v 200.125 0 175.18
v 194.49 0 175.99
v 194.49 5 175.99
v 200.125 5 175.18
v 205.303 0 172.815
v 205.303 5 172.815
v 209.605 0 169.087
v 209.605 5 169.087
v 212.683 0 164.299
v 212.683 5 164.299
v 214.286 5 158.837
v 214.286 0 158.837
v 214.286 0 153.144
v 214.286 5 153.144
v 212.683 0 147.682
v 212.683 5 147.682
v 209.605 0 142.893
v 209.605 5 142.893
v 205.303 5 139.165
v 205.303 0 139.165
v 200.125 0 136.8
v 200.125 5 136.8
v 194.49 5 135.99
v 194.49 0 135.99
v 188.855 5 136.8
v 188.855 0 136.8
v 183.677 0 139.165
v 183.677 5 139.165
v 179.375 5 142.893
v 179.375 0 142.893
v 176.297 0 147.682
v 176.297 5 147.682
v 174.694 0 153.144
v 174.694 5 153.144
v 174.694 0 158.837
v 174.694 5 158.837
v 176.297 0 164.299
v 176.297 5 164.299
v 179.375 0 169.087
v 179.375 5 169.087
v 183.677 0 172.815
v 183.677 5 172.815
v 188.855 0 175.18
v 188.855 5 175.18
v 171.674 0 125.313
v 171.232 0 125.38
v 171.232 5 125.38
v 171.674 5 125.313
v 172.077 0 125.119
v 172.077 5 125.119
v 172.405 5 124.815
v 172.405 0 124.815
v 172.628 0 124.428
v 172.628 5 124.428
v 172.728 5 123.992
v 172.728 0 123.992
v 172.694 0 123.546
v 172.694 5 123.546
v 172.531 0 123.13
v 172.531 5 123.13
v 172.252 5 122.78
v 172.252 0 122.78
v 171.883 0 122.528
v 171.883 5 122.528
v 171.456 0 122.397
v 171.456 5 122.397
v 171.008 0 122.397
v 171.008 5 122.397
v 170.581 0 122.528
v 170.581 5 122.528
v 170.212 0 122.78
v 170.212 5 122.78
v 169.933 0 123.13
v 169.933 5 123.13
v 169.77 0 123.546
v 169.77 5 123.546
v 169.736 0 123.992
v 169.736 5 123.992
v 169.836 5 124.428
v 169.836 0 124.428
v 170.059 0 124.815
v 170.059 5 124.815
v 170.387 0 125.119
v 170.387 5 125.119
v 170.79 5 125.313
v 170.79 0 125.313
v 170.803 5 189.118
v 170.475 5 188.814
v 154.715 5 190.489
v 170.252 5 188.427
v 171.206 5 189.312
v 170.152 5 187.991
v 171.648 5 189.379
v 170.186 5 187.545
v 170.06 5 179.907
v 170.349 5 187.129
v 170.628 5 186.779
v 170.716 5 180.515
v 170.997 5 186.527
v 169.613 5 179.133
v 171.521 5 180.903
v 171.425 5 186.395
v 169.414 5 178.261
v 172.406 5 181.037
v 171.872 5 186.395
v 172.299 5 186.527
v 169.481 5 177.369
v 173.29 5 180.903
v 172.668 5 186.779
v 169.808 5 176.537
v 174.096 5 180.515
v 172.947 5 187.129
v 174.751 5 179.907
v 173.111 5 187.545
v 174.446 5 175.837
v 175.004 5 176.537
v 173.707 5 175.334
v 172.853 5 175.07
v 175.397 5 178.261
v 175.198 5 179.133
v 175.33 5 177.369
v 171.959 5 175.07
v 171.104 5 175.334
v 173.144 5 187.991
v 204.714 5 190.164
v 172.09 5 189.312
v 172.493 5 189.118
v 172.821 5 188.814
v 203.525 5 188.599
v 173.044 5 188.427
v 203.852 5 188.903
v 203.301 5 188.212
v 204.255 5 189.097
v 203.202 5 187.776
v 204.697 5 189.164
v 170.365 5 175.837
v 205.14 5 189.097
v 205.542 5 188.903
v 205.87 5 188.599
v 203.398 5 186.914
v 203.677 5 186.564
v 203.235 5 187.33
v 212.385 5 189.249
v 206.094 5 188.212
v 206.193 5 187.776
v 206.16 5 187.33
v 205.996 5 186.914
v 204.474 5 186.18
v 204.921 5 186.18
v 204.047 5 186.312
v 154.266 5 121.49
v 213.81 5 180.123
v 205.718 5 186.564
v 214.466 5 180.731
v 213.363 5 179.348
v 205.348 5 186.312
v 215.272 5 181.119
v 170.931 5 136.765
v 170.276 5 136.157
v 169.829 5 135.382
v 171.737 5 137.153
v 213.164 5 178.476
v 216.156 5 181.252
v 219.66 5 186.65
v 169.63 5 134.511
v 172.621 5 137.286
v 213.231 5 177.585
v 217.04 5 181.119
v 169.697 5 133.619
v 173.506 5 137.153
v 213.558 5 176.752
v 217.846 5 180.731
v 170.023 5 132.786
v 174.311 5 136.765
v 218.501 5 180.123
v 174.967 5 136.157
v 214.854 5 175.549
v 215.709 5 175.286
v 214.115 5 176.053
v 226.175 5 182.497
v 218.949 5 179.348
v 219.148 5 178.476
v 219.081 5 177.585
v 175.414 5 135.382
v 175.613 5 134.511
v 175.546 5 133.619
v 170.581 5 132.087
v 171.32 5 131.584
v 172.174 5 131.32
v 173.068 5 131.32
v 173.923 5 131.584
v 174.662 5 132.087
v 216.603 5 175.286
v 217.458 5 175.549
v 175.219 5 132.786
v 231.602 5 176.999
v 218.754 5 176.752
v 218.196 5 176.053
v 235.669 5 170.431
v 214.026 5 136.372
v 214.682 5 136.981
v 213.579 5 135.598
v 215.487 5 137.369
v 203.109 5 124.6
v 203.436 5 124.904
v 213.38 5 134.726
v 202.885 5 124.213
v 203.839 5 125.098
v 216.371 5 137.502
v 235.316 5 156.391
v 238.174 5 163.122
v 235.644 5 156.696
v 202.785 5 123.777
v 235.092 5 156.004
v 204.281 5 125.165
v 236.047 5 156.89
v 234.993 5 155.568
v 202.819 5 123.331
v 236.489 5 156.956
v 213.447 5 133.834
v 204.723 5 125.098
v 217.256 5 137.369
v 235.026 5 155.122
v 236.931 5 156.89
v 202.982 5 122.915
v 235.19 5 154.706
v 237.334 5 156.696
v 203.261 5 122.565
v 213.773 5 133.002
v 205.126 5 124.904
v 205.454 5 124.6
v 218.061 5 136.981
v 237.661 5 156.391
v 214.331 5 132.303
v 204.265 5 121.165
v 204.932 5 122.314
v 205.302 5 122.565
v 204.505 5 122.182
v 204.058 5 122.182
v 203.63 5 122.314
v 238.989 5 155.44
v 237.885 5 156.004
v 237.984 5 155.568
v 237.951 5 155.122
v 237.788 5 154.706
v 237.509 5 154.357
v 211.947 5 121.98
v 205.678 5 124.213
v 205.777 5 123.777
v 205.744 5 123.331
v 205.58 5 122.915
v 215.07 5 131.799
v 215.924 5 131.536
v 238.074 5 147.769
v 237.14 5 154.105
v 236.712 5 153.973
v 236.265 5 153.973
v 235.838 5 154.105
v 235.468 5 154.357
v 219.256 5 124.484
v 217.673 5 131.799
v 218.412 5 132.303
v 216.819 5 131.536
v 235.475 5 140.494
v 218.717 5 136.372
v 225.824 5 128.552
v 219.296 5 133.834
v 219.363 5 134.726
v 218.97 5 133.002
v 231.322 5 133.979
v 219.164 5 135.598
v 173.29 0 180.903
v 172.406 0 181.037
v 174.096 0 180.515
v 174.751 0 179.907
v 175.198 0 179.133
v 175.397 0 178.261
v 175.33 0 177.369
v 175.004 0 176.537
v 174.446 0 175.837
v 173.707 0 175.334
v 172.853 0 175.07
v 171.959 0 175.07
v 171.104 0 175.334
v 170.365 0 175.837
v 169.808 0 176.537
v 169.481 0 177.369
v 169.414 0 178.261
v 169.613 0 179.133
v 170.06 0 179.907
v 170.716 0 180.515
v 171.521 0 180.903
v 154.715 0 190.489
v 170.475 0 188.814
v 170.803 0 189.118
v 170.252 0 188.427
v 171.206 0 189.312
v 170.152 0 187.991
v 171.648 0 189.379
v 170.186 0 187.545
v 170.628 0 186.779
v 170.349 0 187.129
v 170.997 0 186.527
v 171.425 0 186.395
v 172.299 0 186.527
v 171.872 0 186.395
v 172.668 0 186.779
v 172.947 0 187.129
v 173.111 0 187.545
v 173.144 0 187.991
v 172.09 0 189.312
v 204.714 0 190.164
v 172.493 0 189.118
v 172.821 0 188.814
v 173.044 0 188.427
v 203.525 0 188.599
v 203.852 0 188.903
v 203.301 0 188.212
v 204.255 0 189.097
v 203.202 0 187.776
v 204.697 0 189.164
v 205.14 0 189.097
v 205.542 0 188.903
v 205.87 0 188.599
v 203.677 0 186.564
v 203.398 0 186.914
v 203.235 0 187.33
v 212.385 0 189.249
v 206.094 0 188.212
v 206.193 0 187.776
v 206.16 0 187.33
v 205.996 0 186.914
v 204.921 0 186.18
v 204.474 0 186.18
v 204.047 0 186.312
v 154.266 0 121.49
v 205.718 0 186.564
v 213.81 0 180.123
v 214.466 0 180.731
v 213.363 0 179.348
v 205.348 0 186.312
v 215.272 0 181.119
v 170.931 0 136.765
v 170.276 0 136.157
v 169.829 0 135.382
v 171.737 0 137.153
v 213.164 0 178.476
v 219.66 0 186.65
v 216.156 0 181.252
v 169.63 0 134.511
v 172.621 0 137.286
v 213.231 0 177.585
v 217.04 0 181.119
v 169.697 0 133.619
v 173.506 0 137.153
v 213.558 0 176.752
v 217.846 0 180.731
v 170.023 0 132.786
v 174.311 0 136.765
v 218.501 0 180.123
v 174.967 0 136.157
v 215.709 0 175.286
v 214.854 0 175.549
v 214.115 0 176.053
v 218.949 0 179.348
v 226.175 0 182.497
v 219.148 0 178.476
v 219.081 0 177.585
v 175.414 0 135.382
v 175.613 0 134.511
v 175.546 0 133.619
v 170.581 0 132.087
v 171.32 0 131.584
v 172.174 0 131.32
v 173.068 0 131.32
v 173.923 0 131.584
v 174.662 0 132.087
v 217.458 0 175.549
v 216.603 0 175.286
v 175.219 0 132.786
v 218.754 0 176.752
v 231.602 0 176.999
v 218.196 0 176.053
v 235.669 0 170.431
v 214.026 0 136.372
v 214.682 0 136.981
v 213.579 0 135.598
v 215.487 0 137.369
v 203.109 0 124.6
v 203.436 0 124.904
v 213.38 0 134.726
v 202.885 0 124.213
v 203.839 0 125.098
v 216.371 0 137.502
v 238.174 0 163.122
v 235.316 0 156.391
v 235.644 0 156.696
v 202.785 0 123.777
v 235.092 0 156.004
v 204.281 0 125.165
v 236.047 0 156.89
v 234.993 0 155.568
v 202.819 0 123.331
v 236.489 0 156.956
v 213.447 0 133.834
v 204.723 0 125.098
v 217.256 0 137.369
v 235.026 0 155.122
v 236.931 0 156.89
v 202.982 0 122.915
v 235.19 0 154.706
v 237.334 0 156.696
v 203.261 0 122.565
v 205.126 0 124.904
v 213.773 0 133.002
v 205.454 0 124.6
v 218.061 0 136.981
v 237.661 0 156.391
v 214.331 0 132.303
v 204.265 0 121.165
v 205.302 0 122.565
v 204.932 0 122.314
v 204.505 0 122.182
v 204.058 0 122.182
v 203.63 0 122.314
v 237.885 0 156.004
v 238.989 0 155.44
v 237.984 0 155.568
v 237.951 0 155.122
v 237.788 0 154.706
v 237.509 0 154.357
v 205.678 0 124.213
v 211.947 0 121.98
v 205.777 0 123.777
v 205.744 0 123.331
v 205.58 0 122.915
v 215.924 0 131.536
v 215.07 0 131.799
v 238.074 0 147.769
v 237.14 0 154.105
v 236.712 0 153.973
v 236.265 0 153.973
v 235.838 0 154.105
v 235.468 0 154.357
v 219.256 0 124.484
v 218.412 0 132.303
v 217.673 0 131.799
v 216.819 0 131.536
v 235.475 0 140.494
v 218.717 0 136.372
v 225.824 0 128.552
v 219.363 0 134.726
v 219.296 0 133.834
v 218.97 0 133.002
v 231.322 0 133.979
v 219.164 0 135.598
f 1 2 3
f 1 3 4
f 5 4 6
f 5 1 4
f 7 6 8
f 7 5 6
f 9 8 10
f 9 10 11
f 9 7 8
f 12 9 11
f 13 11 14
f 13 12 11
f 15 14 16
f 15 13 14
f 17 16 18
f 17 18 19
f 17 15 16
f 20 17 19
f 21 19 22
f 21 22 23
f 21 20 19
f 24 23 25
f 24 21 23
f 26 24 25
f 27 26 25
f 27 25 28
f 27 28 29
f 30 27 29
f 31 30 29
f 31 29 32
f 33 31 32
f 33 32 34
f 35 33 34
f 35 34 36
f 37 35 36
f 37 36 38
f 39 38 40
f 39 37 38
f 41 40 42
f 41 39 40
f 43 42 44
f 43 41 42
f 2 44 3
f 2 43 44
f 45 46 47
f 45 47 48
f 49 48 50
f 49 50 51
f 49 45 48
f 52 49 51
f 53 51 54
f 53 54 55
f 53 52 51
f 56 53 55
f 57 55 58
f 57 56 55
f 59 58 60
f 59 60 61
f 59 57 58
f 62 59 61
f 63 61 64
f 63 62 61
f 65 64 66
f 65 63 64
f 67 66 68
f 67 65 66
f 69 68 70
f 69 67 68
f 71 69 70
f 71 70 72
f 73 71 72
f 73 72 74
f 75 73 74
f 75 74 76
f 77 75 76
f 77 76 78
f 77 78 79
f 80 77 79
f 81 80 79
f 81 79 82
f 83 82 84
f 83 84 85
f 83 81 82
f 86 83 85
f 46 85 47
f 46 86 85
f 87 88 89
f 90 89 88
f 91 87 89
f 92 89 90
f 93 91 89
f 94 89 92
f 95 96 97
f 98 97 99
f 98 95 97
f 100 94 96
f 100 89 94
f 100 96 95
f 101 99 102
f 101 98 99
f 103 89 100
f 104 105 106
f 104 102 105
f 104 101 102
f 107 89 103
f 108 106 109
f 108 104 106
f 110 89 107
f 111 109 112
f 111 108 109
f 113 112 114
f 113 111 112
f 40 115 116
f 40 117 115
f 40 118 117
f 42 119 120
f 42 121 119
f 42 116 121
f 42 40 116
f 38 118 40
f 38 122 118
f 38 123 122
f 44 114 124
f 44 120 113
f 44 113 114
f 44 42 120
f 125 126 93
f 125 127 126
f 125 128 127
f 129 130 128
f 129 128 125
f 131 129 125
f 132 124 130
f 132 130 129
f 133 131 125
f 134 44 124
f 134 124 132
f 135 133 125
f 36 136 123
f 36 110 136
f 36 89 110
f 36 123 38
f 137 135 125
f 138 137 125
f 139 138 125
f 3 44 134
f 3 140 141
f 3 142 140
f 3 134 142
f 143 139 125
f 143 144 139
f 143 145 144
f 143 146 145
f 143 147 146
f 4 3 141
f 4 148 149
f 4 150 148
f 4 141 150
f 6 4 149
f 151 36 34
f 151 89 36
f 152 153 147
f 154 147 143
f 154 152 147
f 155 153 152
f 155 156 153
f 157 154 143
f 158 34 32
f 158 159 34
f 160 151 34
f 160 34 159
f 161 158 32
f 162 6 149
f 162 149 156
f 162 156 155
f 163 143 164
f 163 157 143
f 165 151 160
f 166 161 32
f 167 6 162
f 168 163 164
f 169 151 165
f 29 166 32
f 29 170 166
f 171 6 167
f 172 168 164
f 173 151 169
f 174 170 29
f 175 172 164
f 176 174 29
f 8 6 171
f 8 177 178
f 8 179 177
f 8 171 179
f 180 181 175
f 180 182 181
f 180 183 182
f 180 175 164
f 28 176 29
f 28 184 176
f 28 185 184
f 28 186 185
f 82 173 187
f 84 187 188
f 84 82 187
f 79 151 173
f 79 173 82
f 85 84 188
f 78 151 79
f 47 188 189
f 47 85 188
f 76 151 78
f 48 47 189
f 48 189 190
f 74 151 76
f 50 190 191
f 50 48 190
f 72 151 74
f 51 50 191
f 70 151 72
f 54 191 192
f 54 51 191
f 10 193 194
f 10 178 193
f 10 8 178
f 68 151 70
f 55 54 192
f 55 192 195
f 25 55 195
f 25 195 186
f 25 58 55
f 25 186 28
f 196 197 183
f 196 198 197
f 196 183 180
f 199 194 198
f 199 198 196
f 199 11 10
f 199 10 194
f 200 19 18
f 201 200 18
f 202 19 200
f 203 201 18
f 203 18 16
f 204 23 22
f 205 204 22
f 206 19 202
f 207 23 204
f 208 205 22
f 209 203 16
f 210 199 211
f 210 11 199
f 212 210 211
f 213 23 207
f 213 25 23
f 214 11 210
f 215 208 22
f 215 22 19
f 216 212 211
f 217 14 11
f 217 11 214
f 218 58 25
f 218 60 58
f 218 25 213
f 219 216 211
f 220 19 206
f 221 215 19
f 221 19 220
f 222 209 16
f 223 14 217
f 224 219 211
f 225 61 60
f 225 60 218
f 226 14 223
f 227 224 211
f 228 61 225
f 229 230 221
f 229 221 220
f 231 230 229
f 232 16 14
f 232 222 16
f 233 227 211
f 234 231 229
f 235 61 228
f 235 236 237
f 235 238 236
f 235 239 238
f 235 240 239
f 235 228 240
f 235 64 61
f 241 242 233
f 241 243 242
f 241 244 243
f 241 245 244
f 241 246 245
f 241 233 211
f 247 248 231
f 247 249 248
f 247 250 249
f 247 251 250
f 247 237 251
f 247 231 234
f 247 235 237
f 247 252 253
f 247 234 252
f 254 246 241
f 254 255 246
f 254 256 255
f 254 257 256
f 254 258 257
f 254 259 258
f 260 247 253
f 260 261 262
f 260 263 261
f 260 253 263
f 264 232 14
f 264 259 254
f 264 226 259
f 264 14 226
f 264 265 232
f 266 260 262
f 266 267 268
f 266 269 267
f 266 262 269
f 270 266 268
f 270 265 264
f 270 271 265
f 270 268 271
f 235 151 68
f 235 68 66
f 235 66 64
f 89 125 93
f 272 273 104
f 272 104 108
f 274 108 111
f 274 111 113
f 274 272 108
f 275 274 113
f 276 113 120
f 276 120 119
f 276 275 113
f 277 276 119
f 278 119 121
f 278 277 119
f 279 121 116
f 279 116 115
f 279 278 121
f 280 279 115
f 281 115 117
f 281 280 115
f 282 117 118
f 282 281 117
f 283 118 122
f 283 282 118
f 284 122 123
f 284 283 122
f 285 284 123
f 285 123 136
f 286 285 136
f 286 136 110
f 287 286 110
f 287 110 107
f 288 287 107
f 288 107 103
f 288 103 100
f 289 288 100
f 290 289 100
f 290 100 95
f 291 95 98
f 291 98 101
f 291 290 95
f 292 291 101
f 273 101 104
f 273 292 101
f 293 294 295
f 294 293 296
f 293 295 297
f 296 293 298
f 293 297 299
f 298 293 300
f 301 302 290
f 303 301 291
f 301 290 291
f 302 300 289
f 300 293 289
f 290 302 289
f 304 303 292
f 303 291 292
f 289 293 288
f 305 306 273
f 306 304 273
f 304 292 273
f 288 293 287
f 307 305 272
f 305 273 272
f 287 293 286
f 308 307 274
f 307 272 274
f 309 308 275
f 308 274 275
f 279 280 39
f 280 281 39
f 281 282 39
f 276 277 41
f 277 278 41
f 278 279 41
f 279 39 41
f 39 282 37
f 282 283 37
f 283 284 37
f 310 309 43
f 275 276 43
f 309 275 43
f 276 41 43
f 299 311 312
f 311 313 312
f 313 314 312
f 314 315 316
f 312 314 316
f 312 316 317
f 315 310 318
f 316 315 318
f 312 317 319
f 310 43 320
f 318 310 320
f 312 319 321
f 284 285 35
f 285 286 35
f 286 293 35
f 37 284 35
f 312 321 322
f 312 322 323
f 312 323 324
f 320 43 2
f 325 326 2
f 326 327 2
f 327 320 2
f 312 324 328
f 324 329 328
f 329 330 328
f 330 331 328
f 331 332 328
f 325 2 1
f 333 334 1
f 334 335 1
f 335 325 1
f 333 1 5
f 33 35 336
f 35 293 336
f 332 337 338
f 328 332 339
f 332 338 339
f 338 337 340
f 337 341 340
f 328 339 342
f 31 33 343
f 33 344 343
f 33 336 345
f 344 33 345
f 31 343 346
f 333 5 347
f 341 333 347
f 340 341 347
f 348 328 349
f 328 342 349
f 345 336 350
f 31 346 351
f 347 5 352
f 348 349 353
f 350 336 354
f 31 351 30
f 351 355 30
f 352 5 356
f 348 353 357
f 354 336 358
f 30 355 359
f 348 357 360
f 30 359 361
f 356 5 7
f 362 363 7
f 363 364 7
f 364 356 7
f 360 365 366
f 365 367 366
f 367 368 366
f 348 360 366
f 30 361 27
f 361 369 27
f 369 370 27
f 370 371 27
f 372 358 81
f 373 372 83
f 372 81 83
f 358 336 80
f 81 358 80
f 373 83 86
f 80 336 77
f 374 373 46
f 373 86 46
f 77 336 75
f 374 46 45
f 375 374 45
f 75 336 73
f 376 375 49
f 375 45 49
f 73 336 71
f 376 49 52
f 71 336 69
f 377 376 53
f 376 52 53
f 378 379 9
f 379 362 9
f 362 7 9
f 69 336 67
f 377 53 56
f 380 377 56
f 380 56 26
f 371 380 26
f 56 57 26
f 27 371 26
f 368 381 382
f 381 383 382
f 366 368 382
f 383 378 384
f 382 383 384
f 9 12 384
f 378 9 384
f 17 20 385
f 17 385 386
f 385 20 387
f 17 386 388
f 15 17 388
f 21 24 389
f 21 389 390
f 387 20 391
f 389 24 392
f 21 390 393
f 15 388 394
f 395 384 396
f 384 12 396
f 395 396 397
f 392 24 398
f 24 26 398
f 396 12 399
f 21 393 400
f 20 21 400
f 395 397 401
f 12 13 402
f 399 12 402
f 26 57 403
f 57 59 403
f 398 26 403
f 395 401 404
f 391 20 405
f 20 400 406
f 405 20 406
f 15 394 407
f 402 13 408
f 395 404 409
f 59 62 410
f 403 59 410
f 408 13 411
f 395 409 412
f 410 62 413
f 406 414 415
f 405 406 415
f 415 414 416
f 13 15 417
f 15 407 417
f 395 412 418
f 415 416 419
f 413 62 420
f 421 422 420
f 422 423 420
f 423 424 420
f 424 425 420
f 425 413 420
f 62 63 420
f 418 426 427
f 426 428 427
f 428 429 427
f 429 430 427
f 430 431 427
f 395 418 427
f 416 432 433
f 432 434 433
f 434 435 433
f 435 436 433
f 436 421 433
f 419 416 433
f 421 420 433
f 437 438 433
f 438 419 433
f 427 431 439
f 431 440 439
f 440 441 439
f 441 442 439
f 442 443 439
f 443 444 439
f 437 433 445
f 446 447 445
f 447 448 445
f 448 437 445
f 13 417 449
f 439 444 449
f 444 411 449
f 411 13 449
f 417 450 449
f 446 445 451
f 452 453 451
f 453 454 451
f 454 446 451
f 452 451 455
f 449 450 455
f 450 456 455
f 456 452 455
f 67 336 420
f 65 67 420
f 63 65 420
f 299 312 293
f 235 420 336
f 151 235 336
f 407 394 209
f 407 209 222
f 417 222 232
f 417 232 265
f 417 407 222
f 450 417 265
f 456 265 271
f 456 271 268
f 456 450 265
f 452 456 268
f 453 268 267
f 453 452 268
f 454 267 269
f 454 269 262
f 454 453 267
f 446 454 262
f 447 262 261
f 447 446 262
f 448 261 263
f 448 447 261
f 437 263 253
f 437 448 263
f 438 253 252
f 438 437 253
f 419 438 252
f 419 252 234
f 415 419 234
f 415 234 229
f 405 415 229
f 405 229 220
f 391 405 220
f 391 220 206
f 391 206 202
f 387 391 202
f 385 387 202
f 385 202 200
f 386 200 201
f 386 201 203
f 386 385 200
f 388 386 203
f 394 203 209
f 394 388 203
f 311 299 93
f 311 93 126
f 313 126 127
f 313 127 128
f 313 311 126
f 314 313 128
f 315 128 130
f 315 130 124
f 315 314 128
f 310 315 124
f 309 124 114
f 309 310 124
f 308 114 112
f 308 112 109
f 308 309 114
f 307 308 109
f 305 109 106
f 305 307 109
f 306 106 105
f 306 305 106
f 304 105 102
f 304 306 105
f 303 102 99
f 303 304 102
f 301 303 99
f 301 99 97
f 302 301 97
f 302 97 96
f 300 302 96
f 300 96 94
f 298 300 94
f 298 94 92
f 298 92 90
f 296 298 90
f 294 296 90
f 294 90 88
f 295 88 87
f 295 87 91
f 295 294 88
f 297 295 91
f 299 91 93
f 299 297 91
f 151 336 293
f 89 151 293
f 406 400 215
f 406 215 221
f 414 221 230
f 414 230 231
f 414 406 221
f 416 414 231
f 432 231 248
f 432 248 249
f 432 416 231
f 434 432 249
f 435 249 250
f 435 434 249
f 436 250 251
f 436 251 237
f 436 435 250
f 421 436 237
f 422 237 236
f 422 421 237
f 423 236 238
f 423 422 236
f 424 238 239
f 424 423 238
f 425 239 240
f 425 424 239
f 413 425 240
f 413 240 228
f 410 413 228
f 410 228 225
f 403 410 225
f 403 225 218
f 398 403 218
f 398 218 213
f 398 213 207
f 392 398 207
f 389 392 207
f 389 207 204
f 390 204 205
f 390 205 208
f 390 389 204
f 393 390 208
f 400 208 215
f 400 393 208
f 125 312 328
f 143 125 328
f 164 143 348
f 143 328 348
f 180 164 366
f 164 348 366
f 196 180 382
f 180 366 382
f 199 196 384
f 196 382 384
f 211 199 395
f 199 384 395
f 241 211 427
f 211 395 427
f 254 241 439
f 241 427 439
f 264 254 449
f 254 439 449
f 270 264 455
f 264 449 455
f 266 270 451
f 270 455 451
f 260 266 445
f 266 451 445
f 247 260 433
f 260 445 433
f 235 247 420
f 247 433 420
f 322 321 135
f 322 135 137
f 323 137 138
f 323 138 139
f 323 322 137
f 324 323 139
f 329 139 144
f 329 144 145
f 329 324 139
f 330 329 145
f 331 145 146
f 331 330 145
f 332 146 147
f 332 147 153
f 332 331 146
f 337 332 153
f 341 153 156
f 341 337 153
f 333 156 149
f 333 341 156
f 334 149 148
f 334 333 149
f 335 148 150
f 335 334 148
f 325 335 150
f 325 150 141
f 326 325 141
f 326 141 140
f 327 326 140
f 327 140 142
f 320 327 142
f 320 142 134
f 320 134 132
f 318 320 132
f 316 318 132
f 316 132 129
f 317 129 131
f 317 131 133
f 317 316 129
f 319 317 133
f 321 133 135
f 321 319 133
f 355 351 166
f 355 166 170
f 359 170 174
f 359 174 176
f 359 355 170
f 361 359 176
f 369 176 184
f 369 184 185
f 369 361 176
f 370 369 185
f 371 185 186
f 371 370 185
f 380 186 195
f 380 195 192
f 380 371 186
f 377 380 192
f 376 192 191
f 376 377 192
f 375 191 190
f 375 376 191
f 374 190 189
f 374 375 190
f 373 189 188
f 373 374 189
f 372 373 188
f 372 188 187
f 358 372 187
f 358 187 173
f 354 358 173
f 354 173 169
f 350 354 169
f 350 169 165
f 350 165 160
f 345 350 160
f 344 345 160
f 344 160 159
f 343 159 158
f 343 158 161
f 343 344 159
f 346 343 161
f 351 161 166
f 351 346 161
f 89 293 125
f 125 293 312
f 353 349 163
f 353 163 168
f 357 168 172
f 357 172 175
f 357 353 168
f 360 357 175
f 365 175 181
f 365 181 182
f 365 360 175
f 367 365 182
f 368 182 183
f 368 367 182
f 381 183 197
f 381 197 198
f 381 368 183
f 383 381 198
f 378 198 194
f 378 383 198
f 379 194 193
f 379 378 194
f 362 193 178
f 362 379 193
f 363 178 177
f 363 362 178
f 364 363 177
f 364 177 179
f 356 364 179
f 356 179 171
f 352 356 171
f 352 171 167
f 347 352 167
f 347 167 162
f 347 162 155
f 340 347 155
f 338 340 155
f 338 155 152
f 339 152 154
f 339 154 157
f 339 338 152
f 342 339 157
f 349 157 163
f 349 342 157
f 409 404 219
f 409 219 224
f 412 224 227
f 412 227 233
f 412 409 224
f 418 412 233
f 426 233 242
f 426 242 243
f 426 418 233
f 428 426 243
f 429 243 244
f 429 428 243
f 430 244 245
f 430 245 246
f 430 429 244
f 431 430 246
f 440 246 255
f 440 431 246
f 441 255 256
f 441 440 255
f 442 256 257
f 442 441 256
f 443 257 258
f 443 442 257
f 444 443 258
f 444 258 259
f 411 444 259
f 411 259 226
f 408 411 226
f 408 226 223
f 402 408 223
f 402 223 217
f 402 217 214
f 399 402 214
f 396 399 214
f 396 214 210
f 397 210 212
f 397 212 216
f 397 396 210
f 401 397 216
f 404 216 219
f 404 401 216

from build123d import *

# Parameters (mm, degrees)
SKETCH1_R           = 20
SKETCH1_R_2         = 3
SKETCH1_R_3         = 1.5
BOSS_EXTRUDE1_DEPTH = 5


with BuildPart() as part:
    # Sketch1 → Boss-Extrude1 (new body)
    with BuildSketch(Plane(origin=(0, 0, 0), x_dir=(1, 0, 0), z_dir=(0, 1, 0))):
        with BuildLine():
            Line((204.265004565, -121.165074652), (154.266061792, -121.490223172))
            Line((154.266061792, -121.490223172), (154.714766749, -190.488764199))
            Line((154.714766749, -190.488764199), (204.713709523, -190.163615679))
            ThreePointArc((204.713709523, -190.163615679), (238.988627557, -155.439992687), (204.265004565, -121.165074652))
        make_face()
        with Locations(Location((194.489996124, -155.990223157, 0), (0, 0, 270))):
            Circle(SKETCH1_R, mode=Mode.SUBTRACT)
        with Locations(Location((216.371480989, -134.502016601, 0), (0, 0, 270))):
            Circle(SKETCH1_R_2, mode=Mode.SUBTRACT)
        with Locations(Location((171.23195345, -123.879945011, 0), (0, 0, 270))):
            Circle(SKETCH1_R_3, mode=Mode.SUBTRACT)
        with Locations(Location((204.281261991, -123.665021791, 0), (0, 0, 270))):
            Circle(SKETCH1_R_3, mode=Mode.SUBTRACT)
        with Locations(Location((236.488680419, -155.456250113, 0), (0, 0, 270))):
            Circle(SKETCH1_R_3, mode=Mode.SUBTRACT)
        with Locations(Location((171.648143556, -187.87859176, 0), (0, 0, 270))):
            Circle(SKETCH1_R_3, mode=Mode.SUBTRACT)
        with Locations(Location((204.697452097, -187.663668541, 0), (0, 0, 270))):
            Circle(SKETCH1_R_3, mode=Mode.SUBTRACT)
        with Locations(Location((216.155888878, -178.252189218, 0), (0, 0, 270))):
            Circle(SKETCH1_R_2, mode=Mode.SUBTRACT)
        with Locations(Location((172.405716262, -178.036597107, 0), (0, 0, 270))):
            Circle(SKETCH1_R_2, mode=Mode.SUBTRACT)
        with Locations(Location((172.621308373, -134.286424491, 0), (0, 0, 270))):
            Circle(SKETCH1_R_2, mode=Mode.SUBTRACT)
    extrude(amount=BOSS_EXTRUDE1_DEPTH)


solid = part.part
